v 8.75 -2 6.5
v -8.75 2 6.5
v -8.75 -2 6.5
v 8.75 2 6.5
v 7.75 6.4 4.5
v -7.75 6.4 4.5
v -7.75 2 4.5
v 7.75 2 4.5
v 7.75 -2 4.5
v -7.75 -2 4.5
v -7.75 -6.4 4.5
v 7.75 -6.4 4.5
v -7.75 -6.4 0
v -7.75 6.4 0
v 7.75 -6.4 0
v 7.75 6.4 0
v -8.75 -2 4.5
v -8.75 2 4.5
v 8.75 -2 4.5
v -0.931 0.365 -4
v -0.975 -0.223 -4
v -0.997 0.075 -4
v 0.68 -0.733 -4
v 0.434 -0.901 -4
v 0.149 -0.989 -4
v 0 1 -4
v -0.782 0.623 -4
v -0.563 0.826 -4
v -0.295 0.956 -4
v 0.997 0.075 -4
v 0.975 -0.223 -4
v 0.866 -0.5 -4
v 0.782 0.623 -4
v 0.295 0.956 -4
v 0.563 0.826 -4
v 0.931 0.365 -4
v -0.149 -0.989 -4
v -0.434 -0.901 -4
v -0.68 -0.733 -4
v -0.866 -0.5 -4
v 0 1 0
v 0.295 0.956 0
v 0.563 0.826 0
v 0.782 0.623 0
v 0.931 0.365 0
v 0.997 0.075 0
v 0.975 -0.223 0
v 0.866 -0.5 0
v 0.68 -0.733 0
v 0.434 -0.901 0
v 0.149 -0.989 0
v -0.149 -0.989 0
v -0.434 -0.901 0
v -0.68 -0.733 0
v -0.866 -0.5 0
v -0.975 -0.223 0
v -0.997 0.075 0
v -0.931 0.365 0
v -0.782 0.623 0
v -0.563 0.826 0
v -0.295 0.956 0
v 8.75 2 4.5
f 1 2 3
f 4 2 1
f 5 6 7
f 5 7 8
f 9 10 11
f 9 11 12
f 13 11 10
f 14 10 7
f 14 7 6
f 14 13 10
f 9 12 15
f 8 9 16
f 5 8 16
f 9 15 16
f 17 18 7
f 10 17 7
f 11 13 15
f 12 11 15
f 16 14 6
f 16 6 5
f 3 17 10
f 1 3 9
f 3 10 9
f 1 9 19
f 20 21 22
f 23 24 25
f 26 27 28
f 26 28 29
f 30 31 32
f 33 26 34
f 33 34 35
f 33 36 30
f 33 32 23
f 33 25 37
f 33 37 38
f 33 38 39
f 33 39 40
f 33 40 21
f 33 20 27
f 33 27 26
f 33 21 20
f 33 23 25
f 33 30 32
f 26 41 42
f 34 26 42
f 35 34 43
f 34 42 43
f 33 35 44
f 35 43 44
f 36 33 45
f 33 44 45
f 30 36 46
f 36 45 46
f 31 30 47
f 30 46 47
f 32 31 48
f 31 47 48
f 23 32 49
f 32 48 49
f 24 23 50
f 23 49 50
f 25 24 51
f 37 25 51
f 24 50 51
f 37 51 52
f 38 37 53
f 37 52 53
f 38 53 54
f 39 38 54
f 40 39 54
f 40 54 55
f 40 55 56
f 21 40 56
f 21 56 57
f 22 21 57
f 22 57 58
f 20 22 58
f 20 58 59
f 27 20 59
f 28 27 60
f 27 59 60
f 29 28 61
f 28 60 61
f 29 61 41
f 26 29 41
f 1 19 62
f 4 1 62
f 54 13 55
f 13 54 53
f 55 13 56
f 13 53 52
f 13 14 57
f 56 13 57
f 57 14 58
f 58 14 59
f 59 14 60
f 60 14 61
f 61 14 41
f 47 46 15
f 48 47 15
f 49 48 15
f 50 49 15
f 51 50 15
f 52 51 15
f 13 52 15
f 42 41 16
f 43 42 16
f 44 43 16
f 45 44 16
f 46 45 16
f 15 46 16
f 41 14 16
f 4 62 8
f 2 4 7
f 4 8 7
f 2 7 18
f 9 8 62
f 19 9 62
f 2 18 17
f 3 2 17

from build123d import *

# Parameters (mm, degrees)
SKETCH1_W           = 15.5
SKETCH1_H           = 12.8
BOSS_EXTRUDE1_DEPTH = 4.5
SKETCH2_R           = 1
BOSS_EXTRUDE2_DEPTH = 4
BOSS_EXTRUDE3_DEPTH = 2


with BuildPart() as part:
    # Sketch1 → Boss-Extrude1 (new body)
    with BuildSketch(Plane.XY):
        Rectangle(SKETCH1_W, SKETCH1_H)
    extrude(amount=BOSS_EXTRUDE1_DEPTH)

    # Sketch2 → Boss-Extrude2 (add)
    with BuildSketch(Plane(origin=(0, 0, 0), x_dir=(1, 0, 0), z_dir=(0, 0, -1))):
        with Locations(Location((0, 0, 0), (0, 0, 270))):
            Circle(SKETCH2_R)
    extrude(amount=BOSS_EXTRUDE2_DEPTH)

    # Sketch3 → Boss-Extrude3 (add)
    with BuildSketch(Plane.XY.offset(4.5)):
        Polygon((-7.75, 2), (-8.75, 2), (-8.75, -2), (-7.75, -2), (7.75, -2), (8.75, -2), (8.75, 2), (7.75, 2), align=None)
    extrude(amount=BOSS_EXTRUDE3_DEPTH)


solid = part.part
